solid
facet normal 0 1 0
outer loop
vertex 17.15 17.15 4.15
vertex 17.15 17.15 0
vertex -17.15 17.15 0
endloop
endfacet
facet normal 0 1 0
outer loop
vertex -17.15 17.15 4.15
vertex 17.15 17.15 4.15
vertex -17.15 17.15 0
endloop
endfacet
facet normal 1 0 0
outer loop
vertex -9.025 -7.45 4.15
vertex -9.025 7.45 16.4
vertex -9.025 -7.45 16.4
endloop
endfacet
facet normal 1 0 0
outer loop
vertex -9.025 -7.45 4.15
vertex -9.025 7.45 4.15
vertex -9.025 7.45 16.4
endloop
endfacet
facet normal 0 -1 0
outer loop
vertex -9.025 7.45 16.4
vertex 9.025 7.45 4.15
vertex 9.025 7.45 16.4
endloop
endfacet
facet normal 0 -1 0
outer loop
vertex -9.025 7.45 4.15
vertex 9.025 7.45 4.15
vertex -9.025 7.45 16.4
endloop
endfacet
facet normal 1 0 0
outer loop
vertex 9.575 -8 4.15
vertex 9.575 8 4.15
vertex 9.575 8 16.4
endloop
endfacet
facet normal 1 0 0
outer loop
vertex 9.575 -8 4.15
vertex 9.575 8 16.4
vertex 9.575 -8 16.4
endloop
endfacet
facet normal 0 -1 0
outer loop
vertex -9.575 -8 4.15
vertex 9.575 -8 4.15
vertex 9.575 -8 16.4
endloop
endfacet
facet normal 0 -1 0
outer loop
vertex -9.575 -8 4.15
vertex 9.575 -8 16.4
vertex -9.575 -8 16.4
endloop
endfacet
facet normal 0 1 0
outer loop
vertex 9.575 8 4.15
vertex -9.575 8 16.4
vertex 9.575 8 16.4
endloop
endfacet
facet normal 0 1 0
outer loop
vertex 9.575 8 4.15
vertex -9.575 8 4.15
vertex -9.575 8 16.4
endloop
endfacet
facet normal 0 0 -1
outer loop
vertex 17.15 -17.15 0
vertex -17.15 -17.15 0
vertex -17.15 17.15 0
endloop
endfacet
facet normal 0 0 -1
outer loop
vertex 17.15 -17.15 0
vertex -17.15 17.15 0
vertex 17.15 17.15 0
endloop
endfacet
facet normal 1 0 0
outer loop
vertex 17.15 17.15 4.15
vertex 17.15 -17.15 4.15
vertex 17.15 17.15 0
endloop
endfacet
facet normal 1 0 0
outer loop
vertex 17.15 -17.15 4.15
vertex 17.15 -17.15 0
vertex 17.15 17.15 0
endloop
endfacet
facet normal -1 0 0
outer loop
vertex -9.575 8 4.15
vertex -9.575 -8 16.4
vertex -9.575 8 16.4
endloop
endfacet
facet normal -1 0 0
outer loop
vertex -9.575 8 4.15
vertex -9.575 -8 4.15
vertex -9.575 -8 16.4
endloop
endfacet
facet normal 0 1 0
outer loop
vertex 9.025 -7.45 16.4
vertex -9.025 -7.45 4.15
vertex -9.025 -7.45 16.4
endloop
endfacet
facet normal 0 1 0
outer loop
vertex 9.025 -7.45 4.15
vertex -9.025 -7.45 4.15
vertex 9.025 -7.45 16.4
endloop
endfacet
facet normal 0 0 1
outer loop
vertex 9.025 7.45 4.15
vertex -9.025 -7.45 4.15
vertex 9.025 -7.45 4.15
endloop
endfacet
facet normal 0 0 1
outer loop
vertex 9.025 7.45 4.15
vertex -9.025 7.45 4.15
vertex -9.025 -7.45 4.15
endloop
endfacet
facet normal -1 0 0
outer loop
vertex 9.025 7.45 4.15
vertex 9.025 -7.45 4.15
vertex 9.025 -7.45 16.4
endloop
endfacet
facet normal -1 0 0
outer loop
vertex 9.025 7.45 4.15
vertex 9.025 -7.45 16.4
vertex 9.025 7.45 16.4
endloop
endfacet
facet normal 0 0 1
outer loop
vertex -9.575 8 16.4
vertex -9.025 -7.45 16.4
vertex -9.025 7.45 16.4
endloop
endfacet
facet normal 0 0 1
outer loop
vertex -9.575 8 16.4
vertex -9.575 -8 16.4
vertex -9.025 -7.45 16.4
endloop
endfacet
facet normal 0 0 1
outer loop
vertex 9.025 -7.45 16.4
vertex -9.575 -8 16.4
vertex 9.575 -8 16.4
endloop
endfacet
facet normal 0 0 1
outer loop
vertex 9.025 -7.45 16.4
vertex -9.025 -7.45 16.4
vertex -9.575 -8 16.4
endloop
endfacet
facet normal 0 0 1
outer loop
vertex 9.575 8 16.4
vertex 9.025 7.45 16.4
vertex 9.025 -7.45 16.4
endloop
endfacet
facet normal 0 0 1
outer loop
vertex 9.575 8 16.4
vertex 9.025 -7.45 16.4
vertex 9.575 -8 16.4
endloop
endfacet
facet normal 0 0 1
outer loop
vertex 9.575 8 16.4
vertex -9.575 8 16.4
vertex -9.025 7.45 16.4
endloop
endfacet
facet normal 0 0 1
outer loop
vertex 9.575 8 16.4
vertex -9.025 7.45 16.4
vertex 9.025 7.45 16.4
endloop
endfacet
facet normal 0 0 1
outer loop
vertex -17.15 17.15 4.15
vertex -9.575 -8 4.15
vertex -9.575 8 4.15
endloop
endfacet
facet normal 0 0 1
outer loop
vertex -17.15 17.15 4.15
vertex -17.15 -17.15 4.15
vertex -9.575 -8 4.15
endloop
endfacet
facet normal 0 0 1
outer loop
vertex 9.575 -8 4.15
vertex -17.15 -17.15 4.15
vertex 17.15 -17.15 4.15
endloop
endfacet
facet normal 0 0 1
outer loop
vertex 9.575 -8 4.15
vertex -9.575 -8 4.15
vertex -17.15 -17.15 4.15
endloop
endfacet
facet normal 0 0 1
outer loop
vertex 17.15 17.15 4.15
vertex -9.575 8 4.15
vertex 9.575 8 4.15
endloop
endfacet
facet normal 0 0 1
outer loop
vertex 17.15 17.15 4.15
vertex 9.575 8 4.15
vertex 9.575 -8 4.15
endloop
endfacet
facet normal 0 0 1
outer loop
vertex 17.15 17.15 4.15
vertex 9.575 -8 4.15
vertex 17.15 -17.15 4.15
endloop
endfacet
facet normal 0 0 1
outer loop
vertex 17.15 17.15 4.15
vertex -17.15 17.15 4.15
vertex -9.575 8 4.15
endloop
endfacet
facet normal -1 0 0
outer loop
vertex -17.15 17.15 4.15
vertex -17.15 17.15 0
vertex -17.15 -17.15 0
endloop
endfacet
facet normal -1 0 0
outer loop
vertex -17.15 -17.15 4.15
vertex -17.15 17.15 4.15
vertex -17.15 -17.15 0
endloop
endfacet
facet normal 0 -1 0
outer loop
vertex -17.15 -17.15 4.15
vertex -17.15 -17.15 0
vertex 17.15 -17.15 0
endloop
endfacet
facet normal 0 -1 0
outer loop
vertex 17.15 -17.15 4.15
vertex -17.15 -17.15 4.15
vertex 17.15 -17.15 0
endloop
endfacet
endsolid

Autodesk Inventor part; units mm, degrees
ref_plane "YZ Plane" through (0, 0, 0) normal (1, 0, 0) x (0, 1, 0)
ref_plane "XZ Plane" through (0, 0, 0) normal (0, 1, 0) x (-1, 0, 0)
ref_plane "XY Plane" through (0, 0, 0) normal (0, 0, 1) x (1, 0, 0)
sketch "Sketch1" plane through (0, 0, 0) normal (0, 0, 1) x (1, 0, 0)
  line L0 (-17.15, -17.15) -> (17.15, -17.15)
  line L1 (17.15, -17.15) -> (17.15, 17.15)
  line L2 (17.15, 17.15) -> (-17.15, 17.15)
  line L3 (-17.15, 17.15) -> (-17.15, -17.15)
  line L4 (-17.15, -17.15) -> (17.15, 17.15) construction
  line L5 (17.15, -17.15) -> (-17.15, 17.15) construction
  point P0 (0, 0)
  dimension "d0" = 34.3
  dimension "d1" = 34.3
extrude "Extrusion1" add sketch "Sketch1" along normal blind 4.15
sketch "Sketch2" plane through (0, 0, 4.15) normal (0, 0, 1) x (1, 0, 0)
  line L0 (-9.025, -7.45) -> (9.025, -7.45)
  line L1 (9.025, -7.45) -> (9.025, 7.45)
  line L2 (9.025, 7.45) -> (-9.025, 7.45)
  line L3 (-9.025, 7.45) -> (-9.025, -7.45)
  line L4 (-9.025, -7.45) -> (9.025, 7.45) construction
  line L5 (9.025, -7.45) -> (-9.025, 7.45) construction
  line L6 (-9.5751, 8.0001) -> (9.5751, 8.0001)
  line L7 (9.5751, 8.0001) -> (9.5751, -8.0001)
  line L8 (9.5751, -8.0001) -> (-9.5751, -8.0001)
  line L9 (-9.5751, -8.0001) -> (-9.5751, 8.0001)
  point P0 (0, 0)
  dimension "d4" = 18.05
  dimension "d5" = 14.9
extrude "Extrusion2" add sketch "Sketch2" along normal blind 12.25
properties part number "RJ45_bulkhead"
